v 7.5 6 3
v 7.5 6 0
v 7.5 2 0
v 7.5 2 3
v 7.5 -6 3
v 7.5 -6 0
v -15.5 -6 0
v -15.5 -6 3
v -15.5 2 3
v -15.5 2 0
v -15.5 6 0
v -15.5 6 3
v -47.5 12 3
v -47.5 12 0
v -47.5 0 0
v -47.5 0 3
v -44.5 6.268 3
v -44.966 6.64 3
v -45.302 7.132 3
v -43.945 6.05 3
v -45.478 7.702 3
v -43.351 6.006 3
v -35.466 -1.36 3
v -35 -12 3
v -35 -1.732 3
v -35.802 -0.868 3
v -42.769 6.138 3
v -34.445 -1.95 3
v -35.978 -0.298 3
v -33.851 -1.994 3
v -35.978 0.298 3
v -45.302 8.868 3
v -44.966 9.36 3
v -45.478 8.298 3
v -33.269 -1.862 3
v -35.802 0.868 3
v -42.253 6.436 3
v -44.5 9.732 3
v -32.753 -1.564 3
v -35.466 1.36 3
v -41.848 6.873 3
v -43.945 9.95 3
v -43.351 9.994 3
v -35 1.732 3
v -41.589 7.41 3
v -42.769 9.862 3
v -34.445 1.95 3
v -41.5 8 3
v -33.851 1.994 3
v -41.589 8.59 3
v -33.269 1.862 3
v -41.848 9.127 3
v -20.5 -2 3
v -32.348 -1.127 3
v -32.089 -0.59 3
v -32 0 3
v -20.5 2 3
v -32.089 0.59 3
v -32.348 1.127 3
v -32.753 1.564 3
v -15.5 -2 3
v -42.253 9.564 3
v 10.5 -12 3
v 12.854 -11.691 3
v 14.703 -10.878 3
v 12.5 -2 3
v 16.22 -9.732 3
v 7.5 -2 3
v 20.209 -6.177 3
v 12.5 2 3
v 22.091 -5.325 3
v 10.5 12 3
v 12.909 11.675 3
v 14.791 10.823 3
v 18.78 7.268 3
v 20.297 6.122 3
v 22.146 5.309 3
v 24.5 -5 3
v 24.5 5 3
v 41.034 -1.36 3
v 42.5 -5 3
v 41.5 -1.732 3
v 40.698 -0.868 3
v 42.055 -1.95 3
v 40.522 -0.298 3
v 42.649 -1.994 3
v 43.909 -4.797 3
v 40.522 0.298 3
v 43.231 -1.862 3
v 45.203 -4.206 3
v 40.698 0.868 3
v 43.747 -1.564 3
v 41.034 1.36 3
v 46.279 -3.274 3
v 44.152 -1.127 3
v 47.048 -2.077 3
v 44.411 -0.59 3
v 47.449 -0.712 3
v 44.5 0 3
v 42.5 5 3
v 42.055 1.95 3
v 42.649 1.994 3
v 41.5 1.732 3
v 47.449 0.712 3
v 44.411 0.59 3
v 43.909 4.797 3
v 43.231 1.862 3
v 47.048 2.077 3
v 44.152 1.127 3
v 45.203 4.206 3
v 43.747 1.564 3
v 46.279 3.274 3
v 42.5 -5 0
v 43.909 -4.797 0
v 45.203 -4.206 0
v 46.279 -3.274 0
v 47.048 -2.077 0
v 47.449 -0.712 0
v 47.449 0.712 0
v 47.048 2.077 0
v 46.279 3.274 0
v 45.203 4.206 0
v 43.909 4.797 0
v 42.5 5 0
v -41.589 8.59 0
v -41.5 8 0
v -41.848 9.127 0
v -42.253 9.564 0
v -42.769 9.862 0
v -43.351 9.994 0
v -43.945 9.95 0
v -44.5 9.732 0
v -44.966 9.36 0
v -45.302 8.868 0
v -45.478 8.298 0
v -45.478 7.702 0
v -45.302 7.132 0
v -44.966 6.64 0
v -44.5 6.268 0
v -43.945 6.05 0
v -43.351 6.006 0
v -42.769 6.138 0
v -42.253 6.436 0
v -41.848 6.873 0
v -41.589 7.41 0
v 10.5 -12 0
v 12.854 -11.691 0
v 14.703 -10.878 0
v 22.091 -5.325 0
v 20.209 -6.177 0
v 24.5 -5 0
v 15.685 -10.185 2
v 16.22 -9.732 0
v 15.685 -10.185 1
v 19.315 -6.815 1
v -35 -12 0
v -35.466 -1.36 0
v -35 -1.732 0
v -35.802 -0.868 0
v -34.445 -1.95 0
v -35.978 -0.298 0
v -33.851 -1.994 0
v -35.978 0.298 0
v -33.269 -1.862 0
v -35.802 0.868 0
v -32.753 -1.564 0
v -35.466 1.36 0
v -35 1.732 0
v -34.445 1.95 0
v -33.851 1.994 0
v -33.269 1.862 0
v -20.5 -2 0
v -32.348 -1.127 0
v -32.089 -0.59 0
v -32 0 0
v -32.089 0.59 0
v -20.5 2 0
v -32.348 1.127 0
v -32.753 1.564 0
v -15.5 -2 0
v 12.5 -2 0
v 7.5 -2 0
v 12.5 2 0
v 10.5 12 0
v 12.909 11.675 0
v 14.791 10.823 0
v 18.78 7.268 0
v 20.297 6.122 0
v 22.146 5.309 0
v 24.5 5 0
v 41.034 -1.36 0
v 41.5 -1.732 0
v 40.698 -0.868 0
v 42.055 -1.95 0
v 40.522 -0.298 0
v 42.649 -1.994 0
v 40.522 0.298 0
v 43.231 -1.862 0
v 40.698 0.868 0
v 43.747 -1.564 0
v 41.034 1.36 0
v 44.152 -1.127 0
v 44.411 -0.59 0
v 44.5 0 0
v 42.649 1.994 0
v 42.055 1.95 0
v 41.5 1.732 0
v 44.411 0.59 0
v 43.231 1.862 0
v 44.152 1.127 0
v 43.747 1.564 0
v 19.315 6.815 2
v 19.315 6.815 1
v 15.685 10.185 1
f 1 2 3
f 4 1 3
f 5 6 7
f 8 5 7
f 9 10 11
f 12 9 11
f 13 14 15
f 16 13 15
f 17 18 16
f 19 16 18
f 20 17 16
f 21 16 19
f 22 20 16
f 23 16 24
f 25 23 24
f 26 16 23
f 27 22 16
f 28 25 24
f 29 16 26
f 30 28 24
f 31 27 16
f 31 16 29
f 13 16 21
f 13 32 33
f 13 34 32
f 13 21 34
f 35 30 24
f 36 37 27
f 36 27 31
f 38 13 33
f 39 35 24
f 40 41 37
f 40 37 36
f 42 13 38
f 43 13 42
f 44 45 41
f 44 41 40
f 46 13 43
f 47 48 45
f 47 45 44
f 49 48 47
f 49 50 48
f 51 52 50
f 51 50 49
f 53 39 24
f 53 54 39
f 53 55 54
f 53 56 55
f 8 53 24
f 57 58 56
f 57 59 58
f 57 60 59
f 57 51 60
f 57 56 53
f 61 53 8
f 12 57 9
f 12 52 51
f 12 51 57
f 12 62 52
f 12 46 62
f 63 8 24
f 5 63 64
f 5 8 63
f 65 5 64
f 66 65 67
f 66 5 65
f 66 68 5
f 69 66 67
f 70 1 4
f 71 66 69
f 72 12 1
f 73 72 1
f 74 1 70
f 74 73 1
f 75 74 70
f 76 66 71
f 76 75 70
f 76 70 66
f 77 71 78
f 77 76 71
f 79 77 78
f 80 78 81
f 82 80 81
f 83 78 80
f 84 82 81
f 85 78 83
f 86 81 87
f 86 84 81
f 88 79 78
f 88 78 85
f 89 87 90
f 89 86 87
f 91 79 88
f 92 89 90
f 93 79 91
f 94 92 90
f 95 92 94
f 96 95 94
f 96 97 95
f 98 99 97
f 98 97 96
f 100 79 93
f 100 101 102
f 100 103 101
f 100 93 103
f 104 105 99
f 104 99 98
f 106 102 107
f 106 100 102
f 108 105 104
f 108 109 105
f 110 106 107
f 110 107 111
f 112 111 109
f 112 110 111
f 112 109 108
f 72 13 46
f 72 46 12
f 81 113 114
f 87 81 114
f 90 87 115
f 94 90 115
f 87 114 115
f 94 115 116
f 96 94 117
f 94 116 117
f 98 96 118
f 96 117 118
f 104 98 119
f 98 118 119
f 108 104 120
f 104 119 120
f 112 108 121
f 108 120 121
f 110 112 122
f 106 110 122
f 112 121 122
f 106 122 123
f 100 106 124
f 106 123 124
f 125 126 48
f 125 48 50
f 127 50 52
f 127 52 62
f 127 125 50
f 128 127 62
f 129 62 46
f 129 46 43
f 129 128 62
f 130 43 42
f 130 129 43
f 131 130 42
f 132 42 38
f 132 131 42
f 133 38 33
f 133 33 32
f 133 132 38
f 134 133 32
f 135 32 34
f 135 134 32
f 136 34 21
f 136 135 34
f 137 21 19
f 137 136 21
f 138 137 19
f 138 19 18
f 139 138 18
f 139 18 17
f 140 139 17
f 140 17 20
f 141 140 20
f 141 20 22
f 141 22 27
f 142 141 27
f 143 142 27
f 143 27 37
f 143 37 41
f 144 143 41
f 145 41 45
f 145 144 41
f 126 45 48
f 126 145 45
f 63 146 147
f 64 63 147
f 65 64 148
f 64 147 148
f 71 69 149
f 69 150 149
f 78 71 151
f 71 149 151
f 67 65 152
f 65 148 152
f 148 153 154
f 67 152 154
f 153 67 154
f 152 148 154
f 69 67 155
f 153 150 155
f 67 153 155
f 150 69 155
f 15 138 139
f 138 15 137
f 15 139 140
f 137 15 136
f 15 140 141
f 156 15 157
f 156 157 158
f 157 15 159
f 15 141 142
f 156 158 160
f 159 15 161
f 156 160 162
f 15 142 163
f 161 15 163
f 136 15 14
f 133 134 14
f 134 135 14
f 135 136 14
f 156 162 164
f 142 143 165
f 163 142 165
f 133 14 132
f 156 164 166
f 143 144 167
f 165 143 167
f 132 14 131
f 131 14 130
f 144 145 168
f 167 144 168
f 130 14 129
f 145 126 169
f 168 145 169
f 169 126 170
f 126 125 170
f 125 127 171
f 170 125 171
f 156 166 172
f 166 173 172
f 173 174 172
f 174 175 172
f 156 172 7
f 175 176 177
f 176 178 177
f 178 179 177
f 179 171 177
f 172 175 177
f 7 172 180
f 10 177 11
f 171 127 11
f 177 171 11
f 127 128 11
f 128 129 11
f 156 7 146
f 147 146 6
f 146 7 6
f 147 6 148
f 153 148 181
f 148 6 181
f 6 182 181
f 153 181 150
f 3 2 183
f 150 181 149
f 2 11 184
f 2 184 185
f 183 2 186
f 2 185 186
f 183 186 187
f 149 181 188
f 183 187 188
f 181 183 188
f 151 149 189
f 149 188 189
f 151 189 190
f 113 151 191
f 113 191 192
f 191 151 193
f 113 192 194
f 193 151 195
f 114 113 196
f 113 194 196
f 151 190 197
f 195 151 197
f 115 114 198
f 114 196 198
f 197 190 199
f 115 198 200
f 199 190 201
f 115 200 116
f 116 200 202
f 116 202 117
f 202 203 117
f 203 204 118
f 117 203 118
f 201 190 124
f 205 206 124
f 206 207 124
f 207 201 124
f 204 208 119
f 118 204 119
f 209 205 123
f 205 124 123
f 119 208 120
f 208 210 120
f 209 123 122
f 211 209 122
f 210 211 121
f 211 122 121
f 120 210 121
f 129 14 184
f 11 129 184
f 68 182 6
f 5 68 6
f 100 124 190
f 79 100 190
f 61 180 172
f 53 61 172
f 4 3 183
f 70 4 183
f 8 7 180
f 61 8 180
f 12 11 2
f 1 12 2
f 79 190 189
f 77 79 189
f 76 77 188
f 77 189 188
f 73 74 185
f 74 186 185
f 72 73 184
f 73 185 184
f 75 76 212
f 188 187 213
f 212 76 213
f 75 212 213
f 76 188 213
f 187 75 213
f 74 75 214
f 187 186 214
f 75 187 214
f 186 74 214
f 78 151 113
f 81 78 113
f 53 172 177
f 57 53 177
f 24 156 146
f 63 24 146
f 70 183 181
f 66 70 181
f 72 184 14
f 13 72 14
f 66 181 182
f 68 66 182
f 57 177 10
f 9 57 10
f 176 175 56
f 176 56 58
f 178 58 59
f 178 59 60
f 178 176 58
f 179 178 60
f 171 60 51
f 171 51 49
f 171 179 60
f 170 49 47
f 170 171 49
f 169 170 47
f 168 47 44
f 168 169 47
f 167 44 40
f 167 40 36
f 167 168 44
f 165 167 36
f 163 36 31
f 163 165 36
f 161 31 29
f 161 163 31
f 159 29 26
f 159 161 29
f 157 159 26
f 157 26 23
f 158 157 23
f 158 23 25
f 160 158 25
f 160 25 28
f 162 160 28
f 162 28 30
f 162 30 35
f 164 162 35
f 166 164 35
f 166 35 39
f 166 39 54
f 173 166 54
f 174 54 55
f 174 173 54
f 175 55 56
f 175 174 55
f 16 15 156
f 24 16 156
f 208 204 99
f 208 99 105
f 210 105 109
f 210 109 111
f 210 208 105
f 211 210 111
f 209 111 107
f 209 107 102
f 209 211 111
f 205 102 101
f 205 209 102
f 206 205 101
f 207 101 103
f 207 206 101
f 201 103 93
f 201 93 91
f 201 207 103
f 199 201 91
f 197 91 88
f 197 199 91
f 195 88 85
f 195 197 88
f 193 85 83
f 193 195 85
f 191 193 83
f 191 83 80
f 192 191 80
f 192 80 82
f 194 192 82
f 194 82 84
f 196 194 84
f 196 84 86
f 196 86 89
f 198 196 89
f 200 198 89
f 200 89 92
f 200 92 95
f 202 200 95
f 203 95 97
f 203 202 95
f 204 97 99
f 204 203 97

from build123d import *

# Parameters (mm, degrees)
ESQUISSE1_R        = 2
BOSS_EXTRU_1_DEPTH = 3


with BuildPart() as part:
    # Esquisse1 → Boss.-Extru.1 (new body)
    with BuildSketch(Plane.XY):
        with BuildLine():
            Line((-47.5, 12), (-47.5, 0))
            Line((-47.5, 0), (-35, -12))
            Line((-35, -12), (10.5, -12))
            add(Edge.make_bspline(
                [(10.5, -12), (17.5, -12), (17.5, -5), (24.5, -5)],
                knots=[0.5, 0.5, 0.5, 0.5, 1.5, 1.5, 1.5, 1.5], degree=3))
            Line((24.5, -5), (42.5, -5))
            ThreePointArc((42.5, -5), (47.5, 0), (42.5, 5))
            Line((42.5, 5), (24.5, 5))
            add(Edge.make_bspline(
                [(24.5, 5), (17.5, 5), (17.5, 12), (10.5, 12)],
                knots=[0, 0, 0, 0, 1, 1, 1, 1], degree=3))
            Line((10.5, 12), (-47.5, 12))
        make_face()
        with Locations((-34, 0)):
            Circle(ESQUISSE1_R, mode=Mode.SUBTRACT)
        Polygon((-15.5, 2), (-15.5, 6), (7.5, 6), (7.5, 2), (12.5, 2), (12.5, -2), (7.5, -2), (7.5, -6), (-15.5, -6), (-15.5, -2), (-20.5, -2), (-20.5, 2), align=None, mode=Mode.SUBTRACT)
        with Locations((-43.5, 8)):
            Circle(ESQUISSE1_R, mode=Mode.SUBTRACT)
        with Locations((42.5, 0)):
            Circle(ESQUISSE1_R, mode=Mode.SUBTRACT)
    extrude(amount=BOSS_EXTRU_1_DEPTH)


solid = part.part
